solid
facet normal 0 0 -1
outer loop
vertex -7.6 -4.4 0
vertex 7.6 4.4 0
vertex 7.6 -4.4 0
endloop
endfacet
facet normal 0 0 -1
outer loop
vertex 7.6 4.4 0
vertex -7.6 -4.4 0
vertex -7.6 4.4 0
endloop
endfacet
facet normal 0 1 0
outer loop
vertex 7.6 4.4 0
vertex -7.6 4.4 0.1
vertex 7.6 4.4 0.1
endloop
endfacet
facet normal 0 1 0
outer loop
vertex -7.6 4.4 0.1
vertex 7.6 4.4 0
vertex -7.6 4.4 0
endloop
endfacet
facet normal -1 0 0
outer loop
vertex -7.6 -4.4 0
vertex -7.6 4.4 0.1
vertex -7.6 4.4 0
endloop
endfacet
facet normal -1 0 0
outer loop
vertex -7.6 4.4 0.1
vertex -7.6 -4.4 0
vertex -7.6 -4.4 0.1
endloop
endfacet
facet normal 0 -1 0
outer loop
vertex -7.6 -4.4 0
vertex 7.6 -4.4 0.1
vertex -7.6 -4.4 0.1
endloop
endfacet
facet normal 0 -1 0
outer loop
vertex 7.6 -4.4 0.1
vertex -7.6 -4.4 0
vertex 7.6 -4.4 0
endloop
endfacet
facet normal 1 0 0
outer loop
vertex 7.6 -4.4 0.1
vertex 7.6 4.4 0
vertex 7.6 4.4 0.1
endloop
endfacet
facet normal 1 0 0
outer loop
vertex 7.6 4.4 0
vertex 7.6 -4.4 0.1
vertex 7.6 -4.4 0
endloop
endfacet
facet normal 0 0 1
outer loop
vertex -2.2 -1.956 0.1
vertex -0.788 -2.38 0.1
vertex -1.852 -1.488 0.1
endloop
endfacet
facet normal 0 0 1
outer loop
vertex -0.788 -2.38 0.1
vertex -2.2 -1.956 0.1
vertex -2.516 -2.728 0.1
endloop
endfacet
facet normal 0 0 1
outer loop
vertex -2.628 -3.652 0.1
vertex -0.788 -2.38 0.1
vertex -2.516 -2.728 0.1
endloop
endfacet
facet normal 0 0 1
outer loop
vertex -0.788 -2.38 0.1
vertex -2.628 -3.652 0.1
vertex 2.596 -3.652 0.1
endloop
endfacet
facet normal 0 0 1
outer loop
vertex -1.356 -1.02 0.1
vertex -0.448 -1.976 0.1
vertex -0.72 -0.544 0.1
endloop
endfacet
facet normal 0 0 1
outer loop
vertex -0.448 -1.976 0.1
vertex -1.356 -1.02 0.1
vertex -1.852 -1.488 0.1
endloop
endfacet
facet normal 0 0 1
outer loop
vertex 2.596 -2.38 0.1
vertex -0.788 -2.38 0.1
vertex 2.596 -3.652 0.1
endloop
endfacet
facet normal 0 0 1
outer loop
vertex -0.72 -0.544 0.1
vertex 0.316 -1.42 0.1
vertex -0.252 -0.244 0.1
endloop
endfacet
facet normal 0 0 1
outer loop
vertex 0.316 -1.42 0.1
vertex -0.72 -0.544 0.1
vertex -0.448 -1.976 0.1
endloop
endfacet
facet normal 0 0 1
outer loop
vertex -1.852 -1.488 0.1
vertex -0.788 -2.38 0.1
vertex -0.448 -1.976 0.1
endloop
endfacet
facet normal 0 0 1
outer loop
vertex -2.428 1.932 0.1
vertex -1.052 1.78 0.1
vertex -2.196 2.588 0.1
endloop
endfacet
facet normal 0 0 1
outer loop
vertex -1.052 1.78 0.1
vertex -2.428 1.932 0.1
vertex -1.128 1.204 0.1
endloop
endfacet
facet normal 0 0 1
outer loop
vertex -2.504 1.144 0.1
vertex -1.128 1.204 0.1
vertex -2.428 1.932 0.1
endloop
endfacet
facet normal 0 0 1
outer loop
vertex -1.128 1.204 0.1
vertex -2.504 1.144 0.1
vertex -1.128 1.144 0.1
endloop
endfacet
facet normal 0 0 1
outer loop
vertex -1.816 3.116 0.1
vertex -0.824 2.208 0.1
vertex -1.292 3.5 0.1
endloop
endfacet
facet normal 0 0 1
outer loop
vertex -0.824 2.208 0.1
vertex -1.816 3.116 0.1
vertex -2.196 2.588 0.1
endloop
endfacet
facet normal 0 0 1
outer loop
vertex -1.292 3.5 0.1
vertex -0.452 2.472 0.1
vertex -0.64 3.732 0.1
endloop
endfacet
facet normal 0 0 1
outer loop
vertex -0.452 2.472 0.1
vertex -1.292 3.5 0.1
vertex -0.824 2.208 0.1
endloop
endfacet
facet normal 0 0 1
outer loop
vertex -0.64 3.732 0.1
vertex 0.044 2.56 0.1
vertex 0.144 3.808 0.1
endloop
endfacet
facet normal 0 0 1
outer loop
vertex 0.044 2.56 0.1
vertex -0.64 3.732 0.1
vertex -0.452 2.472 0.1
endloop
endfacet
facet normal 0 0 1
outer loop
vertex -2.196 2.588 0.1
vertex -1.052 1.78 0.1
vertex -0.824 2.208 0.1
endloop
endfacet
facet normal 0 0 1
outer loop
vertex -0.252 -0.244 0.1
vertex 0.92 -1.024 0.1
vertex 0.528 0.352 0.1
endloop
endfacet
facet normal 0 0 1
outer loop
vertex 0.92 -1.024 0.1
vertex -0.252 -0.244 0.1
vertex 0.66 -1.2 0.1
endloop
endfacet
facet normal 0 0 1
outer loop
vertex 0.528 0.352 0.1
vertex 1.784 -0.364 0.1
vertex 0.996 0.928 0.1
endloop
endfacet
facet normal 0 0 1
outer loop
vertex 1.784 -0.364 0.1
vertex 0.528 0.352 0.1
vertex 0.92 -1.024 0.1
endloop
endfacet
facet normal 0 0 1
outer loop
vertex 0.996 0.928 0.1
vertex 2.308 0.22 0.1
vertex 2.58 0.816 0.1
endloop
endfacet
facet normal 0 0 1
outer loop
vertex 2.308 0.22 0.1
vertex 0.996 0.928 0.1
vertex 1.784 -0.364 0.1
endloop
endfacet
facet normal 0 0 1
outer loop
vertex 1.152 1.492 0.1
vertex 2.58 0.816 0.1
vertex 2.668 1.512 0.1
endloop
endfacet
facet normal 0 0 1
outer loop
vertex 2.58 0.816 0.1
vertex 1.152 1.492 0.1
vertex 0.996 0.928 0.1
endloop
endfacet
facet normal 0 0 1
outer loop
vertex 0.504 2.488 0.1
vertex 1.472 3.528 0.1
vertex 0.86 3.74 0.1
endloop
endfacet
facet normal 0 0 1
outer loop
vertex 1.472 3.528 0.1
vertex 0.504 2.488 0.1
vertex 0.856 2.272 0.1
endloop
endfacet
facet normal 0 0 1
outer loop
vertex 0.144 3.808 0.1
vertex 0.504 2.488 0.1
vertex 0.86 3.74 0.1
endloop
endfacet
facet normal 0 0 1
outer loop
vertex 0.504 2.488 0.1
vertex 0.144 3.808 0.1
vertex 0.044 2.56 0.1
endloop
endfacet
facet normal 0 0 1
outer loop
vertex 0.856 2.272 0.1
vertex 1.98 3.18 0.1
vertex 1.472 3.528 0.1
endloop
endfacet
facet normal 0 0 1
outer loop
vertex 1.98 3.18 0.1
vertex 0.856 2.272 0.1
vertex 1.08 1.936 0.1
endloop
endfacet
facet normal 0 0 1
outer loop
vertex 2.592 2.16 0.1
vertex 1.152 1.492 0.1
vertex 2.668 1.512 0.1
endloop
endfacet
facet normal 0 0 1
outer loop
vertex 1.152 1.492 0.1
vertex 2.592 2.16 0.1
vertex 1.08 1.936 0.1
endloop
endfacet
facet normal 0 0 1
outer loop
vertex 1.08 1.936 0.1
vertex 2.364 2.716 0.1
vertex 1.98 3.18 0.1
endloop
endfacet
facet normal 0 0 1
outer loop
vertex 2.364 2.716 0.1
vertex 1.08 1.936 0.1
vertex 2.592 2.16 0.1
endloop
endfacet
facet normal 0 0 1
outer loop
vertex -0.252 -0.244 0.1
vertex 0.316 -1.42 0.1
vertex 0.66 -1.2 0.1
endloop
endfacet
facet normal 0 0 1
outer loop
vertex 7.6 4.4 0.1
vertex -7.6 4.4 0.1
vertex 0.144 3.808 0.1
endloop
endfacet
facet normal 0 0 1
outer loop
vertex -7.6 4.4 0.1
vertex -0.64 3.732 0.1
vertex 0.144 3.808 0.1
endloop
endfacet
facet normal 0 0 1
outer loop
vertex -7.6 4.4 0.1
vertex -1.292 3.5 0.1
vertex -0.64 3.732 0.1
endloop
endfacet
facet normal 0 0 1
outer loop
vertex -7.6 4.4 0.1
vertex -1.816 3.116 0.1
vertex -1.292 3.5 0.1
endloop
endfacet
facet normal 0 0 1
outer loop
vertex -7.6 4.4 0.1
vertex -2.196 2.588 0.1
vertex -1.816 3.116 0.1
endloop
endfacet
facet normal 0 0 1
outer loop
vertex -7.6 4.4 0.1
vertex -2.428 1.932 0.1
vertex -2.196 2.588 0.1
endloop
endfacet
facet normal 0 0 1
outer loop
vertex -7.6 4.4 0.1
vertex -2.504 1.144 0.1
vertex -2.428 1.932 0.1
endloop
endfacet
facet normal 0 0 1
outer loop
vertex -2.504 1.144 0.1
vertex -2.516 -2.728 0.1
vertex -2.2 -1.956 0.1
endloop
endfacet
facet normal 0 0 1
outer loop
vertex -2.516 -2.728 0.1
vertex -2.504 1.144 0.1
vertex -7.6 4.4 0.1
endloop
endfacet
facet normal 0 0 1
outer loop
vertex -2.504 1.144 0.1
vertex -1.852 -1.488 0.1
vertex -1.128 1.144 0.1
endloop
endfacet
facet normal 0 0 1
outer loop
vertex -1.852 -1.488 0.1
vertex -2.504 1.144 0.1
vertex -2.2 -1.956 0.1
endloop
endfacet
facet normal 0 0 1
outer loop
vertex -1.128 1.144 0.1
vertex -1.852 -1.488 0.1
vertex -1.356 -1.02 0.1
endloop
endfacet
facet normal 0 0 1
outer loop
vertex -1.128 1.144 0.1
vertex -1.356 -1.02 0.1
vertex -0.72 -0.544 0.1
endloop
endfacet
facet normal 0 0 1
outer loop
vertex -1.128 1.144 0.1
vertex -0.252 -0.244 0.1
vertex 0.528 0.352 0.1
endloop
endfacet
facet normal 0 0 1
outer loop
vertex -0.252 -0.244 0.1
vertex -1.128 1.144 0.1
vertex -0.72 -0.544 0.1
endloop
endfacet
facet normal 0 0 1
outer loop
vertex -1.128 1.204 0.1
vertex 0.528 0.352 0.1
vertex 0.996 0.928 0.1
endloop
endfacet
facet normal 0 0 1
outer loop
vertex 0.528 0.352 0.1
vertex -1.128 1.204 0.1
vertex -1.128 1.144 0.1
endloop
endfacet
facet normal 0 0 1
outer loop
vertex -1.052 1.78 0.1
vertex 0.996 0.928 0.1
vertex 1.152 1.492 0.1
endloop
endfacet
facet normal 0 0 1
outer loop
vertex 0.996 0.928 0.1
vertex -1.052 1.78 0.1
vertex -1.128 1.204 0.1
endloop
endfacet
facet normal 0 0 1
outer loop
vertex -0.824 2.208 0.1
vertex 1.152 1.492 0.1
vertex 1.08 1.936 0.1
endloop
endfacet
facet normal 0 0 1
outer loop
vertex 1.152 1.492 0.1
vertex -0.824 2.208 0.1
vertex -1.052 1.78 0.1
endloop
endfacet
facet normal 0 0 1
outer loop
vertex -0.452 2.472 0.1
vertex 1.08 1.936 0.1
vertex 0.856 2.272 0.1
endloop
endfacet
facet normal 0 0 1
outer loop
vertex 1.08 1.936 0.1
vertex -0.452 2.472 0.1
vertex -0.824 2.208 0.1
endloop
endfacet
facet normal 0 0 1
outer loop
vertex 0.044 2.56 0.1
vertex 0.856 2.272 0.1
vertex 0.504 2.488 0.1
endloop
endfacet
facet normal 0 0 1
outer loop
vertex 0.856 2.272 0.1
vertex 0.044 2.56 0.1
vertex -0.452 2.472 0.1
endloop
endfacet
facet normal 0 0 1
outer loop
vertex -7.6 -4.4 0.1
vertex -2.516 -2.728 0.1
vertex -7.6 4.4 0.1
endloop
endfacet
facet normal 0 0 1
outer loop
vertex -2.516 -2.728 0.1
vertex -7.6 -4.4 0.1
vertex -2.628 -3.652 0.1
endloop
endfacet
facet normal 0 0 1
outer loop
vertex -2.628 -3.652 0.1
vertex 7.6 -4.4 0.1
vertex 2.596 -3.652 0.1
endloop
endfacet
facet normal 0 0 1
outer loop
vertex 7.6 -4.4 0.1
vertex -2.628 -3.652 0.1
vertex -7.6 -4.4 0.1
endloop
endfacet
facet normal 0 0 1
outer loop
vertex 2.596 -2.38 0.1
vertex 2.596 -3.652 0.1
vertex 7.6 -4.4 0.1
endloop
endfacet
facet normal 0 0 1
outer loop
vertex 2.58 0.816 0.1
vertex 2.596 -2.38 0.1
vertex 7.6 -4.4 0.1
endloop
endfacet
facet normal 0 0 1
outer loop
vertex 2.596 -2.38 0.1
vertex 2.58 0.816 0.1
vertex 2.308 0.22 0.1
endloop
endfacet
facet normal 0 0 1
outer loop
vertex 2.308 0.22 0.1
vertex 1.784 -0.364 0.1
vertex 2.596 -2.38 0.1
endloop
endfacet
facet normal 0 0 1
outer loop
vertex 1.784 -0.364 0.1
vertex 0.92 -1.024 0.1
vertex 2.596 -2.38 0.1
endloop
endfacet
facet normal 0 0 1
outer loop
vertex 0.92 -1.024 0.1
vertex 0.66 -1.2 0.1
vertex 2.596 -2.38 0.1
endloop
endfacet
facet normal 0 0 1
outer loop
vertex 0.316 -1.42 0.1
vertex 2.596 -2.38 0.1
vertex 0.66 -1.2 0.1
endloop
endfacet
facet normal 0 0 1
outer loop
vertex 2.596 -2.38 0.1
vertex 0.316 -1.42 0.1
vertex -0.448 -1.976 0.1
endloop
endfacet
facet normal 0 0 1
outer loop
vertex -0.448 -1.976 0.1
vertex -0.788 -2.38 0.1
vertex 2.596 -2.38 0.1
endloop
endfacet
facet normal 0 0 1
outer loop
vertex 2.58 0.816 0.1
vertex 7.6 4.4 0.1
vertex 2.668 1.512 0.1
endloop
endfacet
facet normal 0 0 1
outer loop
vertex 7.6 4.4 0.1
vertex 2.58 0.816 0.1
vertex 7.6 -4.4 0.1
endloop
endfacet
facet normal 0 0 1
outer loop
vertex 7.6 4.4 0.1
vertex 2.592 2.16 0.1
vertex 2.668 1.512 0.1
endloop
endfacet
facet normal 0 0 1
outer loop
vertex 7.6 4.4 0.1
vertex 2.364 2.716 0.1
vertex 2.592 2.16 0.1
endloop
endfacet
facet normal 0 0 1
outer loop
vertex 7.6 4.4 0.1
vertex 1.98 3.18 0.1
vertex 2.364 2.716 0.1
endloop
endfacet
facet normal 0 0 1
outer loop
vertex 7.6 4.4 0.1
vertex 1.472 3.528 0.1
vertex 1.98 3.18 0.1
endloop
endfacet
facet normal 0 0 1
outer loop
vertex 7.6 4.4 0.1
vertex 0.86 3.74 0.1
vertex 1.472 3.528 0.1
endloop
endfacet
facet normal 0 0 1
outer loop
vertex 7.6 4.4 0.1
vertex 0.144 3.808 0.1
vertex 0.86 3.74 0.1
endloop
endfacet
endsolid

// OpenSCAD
// file: s/004452cs02.scad
use <../../lib.scad>
function ldraw_lib__s__004452cs02() = [
// 0 ~Sticker  1.1 x  1.9 with Number "2" - Background
// 0 Name: s\004452cs02.dat
// 0 Author: Takeshi Takahashi [RainbowDolphin]
// 0 !LDRAW_ORG Subpart UPDATE 2022-04
// 0 !LICENSE Licensed under CC BY 2.0 and CC BY 4.0 : see CAreadme.txt
// 
// 0 BFC CERTIFY CCW
  [0,"BFC","CERTIFY"],
  [0,"BFC","CCW"],
// 
// 0 !HISTORY 2022-07-18 [PTadmin] Official Update 2022-04
// 
// 
// 3 16 19 -.25 11 -19 -.25 11 .36 -.25 9.52
  [3,16,19,-.25,11,-19,-.25,11,.36,-.25,9.52],
// 3 16 -19 -.25 11 -1.6 -.25 9.33 .36 -.25 9.52
  [3,16,-19,-.25,11,-1.6,-.25,9.33,.36,-.25,9.52],
// 3 16 -19 -.25 11 -3.23 -.25 8.75 -1.6 -.25 9.33
  [3,16,-19,-.25,11,-3.23,-.25,8.75,-1.6,-.25,9.33],
// 3 16 -19 -.25 11 -4.54 -.25 7.79 -3.23 -.25 8.75
  [3,16,-19,-.25,11,-4.54,-.25,7.79,-3.23,-.25,8.75],
// 3 16 -19 -.25 11 -5.49 -.25 6.47 -4.54 -.25 7.79
  [3,16,-19,-.25,11,-5.49,-.25,6.47,-4.54,-.25,7.79],
// 3 16 -19 -.25 11 -6.07 -.25 4.83 -5.49 -.25 6.47
  [3,16,-19,-.25,11,-6.07,-.25,4.83,-5.49,-.25,6.47],
// 3 16 -19 -.25 11 -6.26 -.25 2.86 -6.07 -.25 4.83
  [3,16,-19,-.25,11,-6.26,-.25,2.86,-6.07,-.25,4.83],
// 4 16 -6.26 -.25 2.86 -19 -.25 11 -6.29 -.25 -6.82 -5.5 -.25 -4.89
  [4,16,-6.26,-.25,2.86,-19,-.25,11,-6.29,-.25,-6.82,-5.5,-.25,-4.89],
// 4 16 -6.26 -.25 2.86 -5.5 -.25 -4.89 -4.63 -.25 -3.72 -2.82 -.25 2.86
  [4,16,-6.26,-.25,2.86,-5.5,-.25,-4.89,-4.63,-.25,-3.72,-2.82,-.25,2.86],
// 3 16 -2.82 -.25 2.86 -4.63 -.25 -3.72 -3.39 -.25 -2.55
  [3,16,-2.82,-.25,2.86,-4.63,-.25,-3.72,-3.39,-.25,-2.55],
// 3 16 -2.82 -.25 2.86 -3.39 -.25 -2.55 -1.8 -.25 -1.36
  [3,16,-2.82,-.25,2.86,-3.39,-.25,-2.55,-1.8,-.25,-1.36],
// 4 16 -2.82 -.25 2.86 -1.8 -.25 -1.36 -.63 -.25 -.61 1.32 -.25 .88
  [4,16,-2.82,-.25,2.86,-1.8,-.25,-1.36,-.63,-.25,-.61,1.32,-.25,.88],
// 4 16 -2.82 -.25 3.01 -2.82 -.25 2.86 1.32 -.25 .88 2.49 -.25 2.32
  [4,16,-2.82,-.25,3.01,-2.82,-.25,2.86,1.32,-.25,.88,2.49,-.25,2.32],
// 4 16 -2.63 -.25 4.45 -2.82 -.25 3.01 2.49 -.25 2.32 2.88 -.25 3.73
  [4,16,-2.63,-.25,4.45,-2.82,-.25,3.01,2.49,-.25,2.32,2.88,-.25,3.73],
// 4 16 -2.06 -.25 5.52 -2.63 -.25 4.45 2.88 -.25 3.73 2.7 -.25 4.84
  [4,16,-2.06,-.25,5.52,-2.63,-.25,4.45,2.88,-.25,3.73,2.7,-.25,4.84],
// 4 16 -1.13 -.25 6.18 -2.06 -.25 5.52 2.7 -.25 4.84 2.14 -.25 5.68
  [4,16,-1.13,-.25,6.18,-2.06,-.25,5.52,2.7,-.25,4.84,2.14,-.25,5.68],
// 4 16 .11 -.25 6.4 -1.13 -.25 6.18 2.14 -.25 5.68 1.26 -.25 6.22
  [4,16,.11,-.25,6.4,-1.13,-.25,6.18,2.14,-.25,5.68,1.26,-.25,6.22],
// 4 16 -6.57 -.25 -9.13 -6.29 -.25 -6.82 -19 -.25 11 -19 -.25 -11
  [4,16,-6.57,-.25,-9.13,-6.29,-.25,-6.82,-19,-.25,11,-19,-.25,-11],
// 4 16 6.49 -.25 -9.13 -6.57 -.25 -9.13 -19 -.25 -11 19 -.25 -11
  [4,16,6.49,-.25,-9.13,-6.57,-.25,-9.13,-19,-.25,-11,19,-.25,-11],
// 3 16 6.49 -.25 -5.95 6.49 -.25 -9.13 19 -.25 -11
  [3,16,6.49,-.25,-5.95,6.49,-.25,-9.13,19,-.25,-11],
// 4 16 6.49 -.25 -5.95 19 -.25 -11 6.45 -.25 2.04 5.77 -.25 .55
  [4,16,6.49,-.25,-5.95,19,-.25,-11,6.45,-.25,2.04,5.77,-.25,.55],
// 3 16 5.77 -.25 .55 4.46 -.25 -.91 6.49 -.25 -5.95
  [3,16,5.77,-.25,.55,4.46,-.25,-.91,6.49,-.25,-5.95],
// 3 16 4.46 -.25 -.91 2.3 -.25 -2.56 6.49 -.25 -5.95
  [3,16,4.46,-.25,-.91,2.3,-.25,-2.56,6.49,-.25,-5.95],
// 3 16 2.3 -.25 -2.56 1.65 -.25 -3 6.49 -.25 -5.95
  [3,16,2.3,-.25,-2.56,1.65,-.25,-3,6.49,-.25,-5.95],
// 4 16 6.49 -.25 -5.95 1.65 -.25 -3 .79 -.25 -3.55 -1.12 -.25 -4.94
  [4,16,6.49,-.25,-5.95,1.65,-.25,-3,.79,-.25,-3.55,-1.12,-.25,-4.94],
// 3 16 -1.12 -.25 -4.94 -1.97 -.25 -5.95 6.49 -.25 -5.95
  [3,16,-1.12,-.25,-4.94,-1.97,-.25,-5.95,6.49,-.25,-5.95],
// 4 16 6.45 -.25 2.04 19 -.25 -11 19 -.25 11 6.67 -.25 3.78
  [4,16,6.45,-.25,2.04,19,-.25,-11,19,-.25,11,6.67,-.25,3.78],
// 3 16 19 -.25 11 6.48 -.25 5.4 6.67 -.25 3.78
  [3,16,19,-.25,11,6.48,-.25,5.4,6.67,-.25,3.78],
// 3 16 19 -.25 11 5.91 -.25 6.79 6.48 -.25 5.4
  [3,16,19,-.25,11,5.91,-.25,6.79,6.48,-.25,5.4],
// 3 16 19 -.25 11 4.95 -.25 7.95 5.91 -.25 6.79
  [3,16,19,-.25,11,4.95,-.25,7.95,5.91,-.25,6.79],
// 3 16 19 -.25 11 3.68 -.25 8.82 4.95 -.25 7.95
  [3,16,19,-.25,11,3.68,-.25,8.82,4.95,-.25,7.95],
// 3 16 19 -.25 11 2.15 -.25 9.35 3.68 -.25 8.82
  [3,16,19,-.25,11,2.15,-.25,9.35,3.68,-.25,8.82],
// 3 16 19 -.25 11 .36 -.25 9.52 2.15 -.25 9.35
  [3,16,19,-.25,11,.36,-.25,9.52,2.15,-.25,9.35],
];
module ldraw_lib__s__004452cs02(step=0, col=false, unit=2/5, alt=false, line=0.2, solid=!$preview)
    makepoly(ldraw_lib__s__004452cs02(), step=step, col=col, unit=unit, alt=alt, line=line, solid=solid);
ldraw_lib__s__004452cs02(line=0.2);
// file: s/004452cs01.scad
use <../../lib.scad>
function ldraw_lib__s__004452cs01() = [
// 0 ~Sticker  1.1 x  1.9 with Number "2" - Type Face
// 0 Name: s\004452cs01.dat
// 0 Author: Takeshi Takahashi [RainbowDolphin]
// 0 !LDRAW_ORG Subpart UPDATE 2022-04
// 0 !LICENSE Licensed under CC BY 2.0 and CC BY 4.0 : see CAreadme.txt
// 
// 0 BFC CERTIFY CCW
  [0,"BFC","CERTIFY"],
  [0,"BFC","CCW"],
// 
// 0 !HISTORY 2022-07-18 [PTadmin] Official Update 2022-04
// 
// 
// 4 16 -5.5 -.25 -4.89 -6.29 -.25 -6.82 -1.97 -.25 -5.95 -4.63 -.25 -3.72
  [4,16,-5.5,-.25,-4.89,-6.29,-.25,-6.82,-1.97,-.25,-5.95,-4.63,-.25,-3.72],
// 4 16 -1.97 -.25 -5.95 -6.29 -.25 -6.82 -6.57 -.25 -9.13 6.49 -.25 -9.13
  [4,16,-1.97,-.25,-5.95,-6.29,-.25,-6.82,-6.57,-.25,-9.13,6.49,-.25,-9.13],
// 4 16 -3.39 -.25 -2.55 -4.63 -.25 -3.72 -1.12 -.25 -4.94 -1.8 -.25 -1.36
  [4,16,-3.39,-.25,-2.55,-4.63,-.25,-3.72,-1.12,-.25,-4.94,-1.8,-.25,-1.36],
// 3 16 6.49 -.25 -5.95 -1.97 -.25 -5.95 6.49 -.25 -9.13
  [3,16,6.49,-.25,-5.95,-1.97,-.25,-5.95,6.49,-.25,-9.13],
// 4 16 .79 -.25 -3.55 -.63 -.25 -.61 -1.8 -.25 -1.36 -1.12 -.25 -4.94
  [4,16,.79,-.25,-3.55,-.63,-.25,-.61,-1.8,-.25,-1.36,-1.12,-.25,-4.94],
// 3 16 -4.63 -.25 -3.72 -1.97 -.25 -5.95 -1.12 -.25 -4.94
  [3,16,-4.63,-.25,-3.72,-1.97,-.25,-5.95,-1.12,-.25,-4.94],
// 4 16 -2.63 -.25 4.45 -5.49 -.25 6.47 -6.07 -.25 4.83 -2.82 -.25 3.01
  [4,16,-2.63,-.25,4.45,-5.49,-.25,6.47,-6.07,-.25,4.83,-2.82,-.25,3.01],
// 4 16 -6.26 -.25 2.86 -2.82 -.25 2.86 -2.82 -.25 3.01 -6.07 -.25 4.83
  [4,16,-6.26,-.25,2.86,-2.82,-.25,2.86,-2.82,-.25,3.01,-6.07,-.25,4.83],
// 4 16 -4.54 -.25 7.79 -5.49 -.25 6.47 -2.06 -.25 5.52 -3.23 -.25 8.75
  [4,16,-4.54,-.25,7.79,-5.49,-.25,6.47,-2.06,-.25,5.52,-3.23,-.25,8.75],
// 4 16 -3.23 -.25 8.75 -2.06 -.25 5.52 -1.13 -.25 6.18 -1.6 -.25 9.33
  [4,16,-3.23,-.25,8.75,-2.06,-.25,5.52,-1.13,-.25,6.18,-1.6,-.25,9.33],
// 4 16 -1.6 -.25 9.33 -1.13 -.25 6.18 .11 -.25 6.4 .36 -.25 9.52
  [4,16,-1.6,-.25,9.33,-1.13,-.25,6.18,.11,-.25,6.4,.36,-.25,9.52],
// 3 16 -5.49 -.25 6.47 -2.63 -.25 4.45 -2.06 -.25 5.52
  [3,16,-5.49,-.25,6.47,-2.63,-.25,4.45,-2.06,-.25,5.52],
// 4 16 -.63 -.25 -.61 1.65 -.25 -3 2.3 -.25 -2.56 1.32 -.25 .88
  [4,16,-.63,-.25,-.61,1.65,-.25,-3,2.3,-.25,-2.56,1.32,-.25,.88],
// 4 16 4.46 -.25 -.91 2.49 -.25 2.32 1.32 -.25 .88 2.3 -.25 -2.56
  [4,16,4.46,-.25,-.91,2.49,-.25,2.32,1.32,-.25,.88,2.3,-.25,-2.56],
// 4 16 5.77 -.25 .55 6.45 -.25 2.04 2.49 -.25 2.32 4.46 -.25 -.91
  [4,16,5.77,-.25,.55,6.45,-.25,2.04,2.49,-.25,2.32,4.46,-.25,-.91],
// 4 16 2.88 -.25 3.73 2.49 -.25 2.32 6.45 -.25 2.04 6.67 -.25 3.78
  [4,16,2.88,-.25,3.73,2.49,-.25,2.32,6.45,-.25,2.04,6.67,-.25,3.78],
// 4 16 1.26 -.25 6.22 2.14 -.25 5.68 3.68 -.25 8.82 2.15 -.25 9.35
  [4,16,1.26,-.25,6.22,2.14,-.25,5.68,3.68,-.25,8.82,2.15,-.25,9.35],
// 4 16 1.26 -.25 6.22 2.15 -.25 9.35 .36 -.25 9.52 .11 -.25 6.4
  [4,16,1.26,-.25,6.22,2.15,-.25,9.35,.36,-.25,9.52,.11,-.25,6.4],
// 4 16 2.14 -.25 5.68 2.7 -.25 4.84 4.95 -.25 7.95 3.68 -.25 8.82
  [4,16,2.14,-.25,5.68,2.7,-.25,4.84,4.95,-.25,7.95,3.68,-.25,8.82],
// 4 16 2.88 -.25 3.73 6.67 -.25 3.78 6.48 -.25 5.4 2.7 -.25 4.84
  [4,16,2.88,-.25,3.73,6.67,-.25,3.78,6.48,-.25,5.4,2.7,-.25,4.84],
// 4 16 2.7 -.25 4.84 6.48 -.25 5.4 5.91 -.25 6.79 4.95 -.25 7.95
  [4,16,2.7,-.25,4.84,6.48,-.25,5.4,5.91,-.25,6.79,4.95,-.25,7.95],
// 3 16 -.63 -.25 -.61 .79 -.25 -3.55 1.65 -.25 -3
  [3,16,-.63,-.25,-.61,.79,-.25,-3.55,1.65,-.25,-3],
];
module ldraw_lib__s__004452cs01(step=0, col=false, unit=2/5, alt=false, line=0.2, solid=!$preview)
    makepoly(ldraw_lib__s__004452cs01(), step=step, col=col, unit=unit, alt=alt, line=line, solid=solid);
ldraw_lib__s__004452cs01(line=0.2);
// file: ../p/box5-12.scad
use <../lib.scad>
function ldraw_lib__box5_12() = [
// 0 Box with 5 Faces without Any Edges
// 0 Name: box5-12.dat
// 0 Author: Chris Dee [cwdee]
// 0 !LDRAW_ORG Primitive UPDATE 2009-02
// 0 !LICENSE Licensed under CC BY 2.0 and CC BY 4.0 : see CAreadme.txt
// 
// 0 BFC CERTIFY CCW
  [0,"BFC","CERTIFY"],
  [0,"BFC","CCW"],
// 
// 0 !HISTORY 2009-09-03 [PTadmin] Official Update 2009-02
// 
// 
// 4 16 1 1 1 1 1 -1 -1 1 -1 -1 1 1
  [4,16,1,1,1,1,1,-1,-1,1,-1,-1,1,1],
// 4 16 -1 0 1 1 0 1 1 1 1 -1 1 1
  [4,16,-1,0,1,1,0,1,1,1,1,-1,1,1],
// 4 16 -1 0 -1 -1 0 1 -1 1 1 -1 1 -1
  [4,16,-1,0,-1,-1,0,1,-1,1,1,-1,1,-1],
// 4 16 1 0 -1 -1 0 -1 -1 1 -1 1 1 -1
  [4,16,1,0,-1,-1,0,-1,-1,1,-1,1,1,-1],
// 4 16 1 0 1 1 0 -1 1 1 -1 1 1 1
  [4,16,1,0,1,1,0,-1,1,1,-1,1,1,1],
// 0
];
module ldraw_lib__box5_12(step=0, col=false, unit=2/5, alt=false, line=0.2, solid=!$preview)
    makepoly(ldraw_lib__box5_12(), step=step, col=col, unit=unit, alt=alt, line=line, solid=solid);
ldraw_lib__box5_12(line=0.2);
// main file
use <../lib.scad>
use <../p/box5-12.scad>
use <s/004452cs01.scad>
use <s/004452cs02.scad>
function ldraw_lib__004452c() = [
// 0 Sticker  1.1 x  1.9 with Black Number "2" on Yellow Background
// 0 Name: 004452c.dat
// 0 Author: Takeshi Takahashi [RainbowDolphin]
// 0 !LDRAW_ORG Part UPDATE 2022-04
// 0 !LICENSE Licensed under CC BY 2.0 and CC BY 4.0 : see CAreadme.txt
// 
// 0 BFC CERTIFY CCW
  [0,"BFC","CERTIFY"],
  [0,"BFC","CCW"],
// 
// 0 !KEYWORDS Fire Station, Set 374-1
// 
// 0 !HISTORY 2022-07-18 [PTadmin] Official Update 2022-04
// 
// 
// 1 16 0 -0.25 0 19 0 0 0 0.25 0 0 0 11 box5-12.dat
  [1,16,0,-0.25,0,19,0,0,0,0.25,0,0,0,11, ldraw_lib__box5_12()],
// 1 0 0 0 0 1 0 0 0 1 0 0 0 1 s\004452cs01.dat
  [1,0,0,0,0,1,0,0,0,1,0,0,0,1, ldraw_lib__s__004452cs01()],
// 1 14 0 0 0 1 0 0 0 1 0 0 0 1 s\004452cs02.dat
  [1,14,0,0,0,1,0,0,0,1,0,0,0,1, ldraw_lib__s__004452cs02()],
];
module ldraw_lib__004452c(step=0, col=false, unit=2/5, alt=false, line=0.2, solid=!$preview)
    makepoly(ldraw_lib__004452c(), step=step, col=col, unit=unit, alt=alt, line=line, solid=solid);
ldraw_lib__004452c(line=0.2);
